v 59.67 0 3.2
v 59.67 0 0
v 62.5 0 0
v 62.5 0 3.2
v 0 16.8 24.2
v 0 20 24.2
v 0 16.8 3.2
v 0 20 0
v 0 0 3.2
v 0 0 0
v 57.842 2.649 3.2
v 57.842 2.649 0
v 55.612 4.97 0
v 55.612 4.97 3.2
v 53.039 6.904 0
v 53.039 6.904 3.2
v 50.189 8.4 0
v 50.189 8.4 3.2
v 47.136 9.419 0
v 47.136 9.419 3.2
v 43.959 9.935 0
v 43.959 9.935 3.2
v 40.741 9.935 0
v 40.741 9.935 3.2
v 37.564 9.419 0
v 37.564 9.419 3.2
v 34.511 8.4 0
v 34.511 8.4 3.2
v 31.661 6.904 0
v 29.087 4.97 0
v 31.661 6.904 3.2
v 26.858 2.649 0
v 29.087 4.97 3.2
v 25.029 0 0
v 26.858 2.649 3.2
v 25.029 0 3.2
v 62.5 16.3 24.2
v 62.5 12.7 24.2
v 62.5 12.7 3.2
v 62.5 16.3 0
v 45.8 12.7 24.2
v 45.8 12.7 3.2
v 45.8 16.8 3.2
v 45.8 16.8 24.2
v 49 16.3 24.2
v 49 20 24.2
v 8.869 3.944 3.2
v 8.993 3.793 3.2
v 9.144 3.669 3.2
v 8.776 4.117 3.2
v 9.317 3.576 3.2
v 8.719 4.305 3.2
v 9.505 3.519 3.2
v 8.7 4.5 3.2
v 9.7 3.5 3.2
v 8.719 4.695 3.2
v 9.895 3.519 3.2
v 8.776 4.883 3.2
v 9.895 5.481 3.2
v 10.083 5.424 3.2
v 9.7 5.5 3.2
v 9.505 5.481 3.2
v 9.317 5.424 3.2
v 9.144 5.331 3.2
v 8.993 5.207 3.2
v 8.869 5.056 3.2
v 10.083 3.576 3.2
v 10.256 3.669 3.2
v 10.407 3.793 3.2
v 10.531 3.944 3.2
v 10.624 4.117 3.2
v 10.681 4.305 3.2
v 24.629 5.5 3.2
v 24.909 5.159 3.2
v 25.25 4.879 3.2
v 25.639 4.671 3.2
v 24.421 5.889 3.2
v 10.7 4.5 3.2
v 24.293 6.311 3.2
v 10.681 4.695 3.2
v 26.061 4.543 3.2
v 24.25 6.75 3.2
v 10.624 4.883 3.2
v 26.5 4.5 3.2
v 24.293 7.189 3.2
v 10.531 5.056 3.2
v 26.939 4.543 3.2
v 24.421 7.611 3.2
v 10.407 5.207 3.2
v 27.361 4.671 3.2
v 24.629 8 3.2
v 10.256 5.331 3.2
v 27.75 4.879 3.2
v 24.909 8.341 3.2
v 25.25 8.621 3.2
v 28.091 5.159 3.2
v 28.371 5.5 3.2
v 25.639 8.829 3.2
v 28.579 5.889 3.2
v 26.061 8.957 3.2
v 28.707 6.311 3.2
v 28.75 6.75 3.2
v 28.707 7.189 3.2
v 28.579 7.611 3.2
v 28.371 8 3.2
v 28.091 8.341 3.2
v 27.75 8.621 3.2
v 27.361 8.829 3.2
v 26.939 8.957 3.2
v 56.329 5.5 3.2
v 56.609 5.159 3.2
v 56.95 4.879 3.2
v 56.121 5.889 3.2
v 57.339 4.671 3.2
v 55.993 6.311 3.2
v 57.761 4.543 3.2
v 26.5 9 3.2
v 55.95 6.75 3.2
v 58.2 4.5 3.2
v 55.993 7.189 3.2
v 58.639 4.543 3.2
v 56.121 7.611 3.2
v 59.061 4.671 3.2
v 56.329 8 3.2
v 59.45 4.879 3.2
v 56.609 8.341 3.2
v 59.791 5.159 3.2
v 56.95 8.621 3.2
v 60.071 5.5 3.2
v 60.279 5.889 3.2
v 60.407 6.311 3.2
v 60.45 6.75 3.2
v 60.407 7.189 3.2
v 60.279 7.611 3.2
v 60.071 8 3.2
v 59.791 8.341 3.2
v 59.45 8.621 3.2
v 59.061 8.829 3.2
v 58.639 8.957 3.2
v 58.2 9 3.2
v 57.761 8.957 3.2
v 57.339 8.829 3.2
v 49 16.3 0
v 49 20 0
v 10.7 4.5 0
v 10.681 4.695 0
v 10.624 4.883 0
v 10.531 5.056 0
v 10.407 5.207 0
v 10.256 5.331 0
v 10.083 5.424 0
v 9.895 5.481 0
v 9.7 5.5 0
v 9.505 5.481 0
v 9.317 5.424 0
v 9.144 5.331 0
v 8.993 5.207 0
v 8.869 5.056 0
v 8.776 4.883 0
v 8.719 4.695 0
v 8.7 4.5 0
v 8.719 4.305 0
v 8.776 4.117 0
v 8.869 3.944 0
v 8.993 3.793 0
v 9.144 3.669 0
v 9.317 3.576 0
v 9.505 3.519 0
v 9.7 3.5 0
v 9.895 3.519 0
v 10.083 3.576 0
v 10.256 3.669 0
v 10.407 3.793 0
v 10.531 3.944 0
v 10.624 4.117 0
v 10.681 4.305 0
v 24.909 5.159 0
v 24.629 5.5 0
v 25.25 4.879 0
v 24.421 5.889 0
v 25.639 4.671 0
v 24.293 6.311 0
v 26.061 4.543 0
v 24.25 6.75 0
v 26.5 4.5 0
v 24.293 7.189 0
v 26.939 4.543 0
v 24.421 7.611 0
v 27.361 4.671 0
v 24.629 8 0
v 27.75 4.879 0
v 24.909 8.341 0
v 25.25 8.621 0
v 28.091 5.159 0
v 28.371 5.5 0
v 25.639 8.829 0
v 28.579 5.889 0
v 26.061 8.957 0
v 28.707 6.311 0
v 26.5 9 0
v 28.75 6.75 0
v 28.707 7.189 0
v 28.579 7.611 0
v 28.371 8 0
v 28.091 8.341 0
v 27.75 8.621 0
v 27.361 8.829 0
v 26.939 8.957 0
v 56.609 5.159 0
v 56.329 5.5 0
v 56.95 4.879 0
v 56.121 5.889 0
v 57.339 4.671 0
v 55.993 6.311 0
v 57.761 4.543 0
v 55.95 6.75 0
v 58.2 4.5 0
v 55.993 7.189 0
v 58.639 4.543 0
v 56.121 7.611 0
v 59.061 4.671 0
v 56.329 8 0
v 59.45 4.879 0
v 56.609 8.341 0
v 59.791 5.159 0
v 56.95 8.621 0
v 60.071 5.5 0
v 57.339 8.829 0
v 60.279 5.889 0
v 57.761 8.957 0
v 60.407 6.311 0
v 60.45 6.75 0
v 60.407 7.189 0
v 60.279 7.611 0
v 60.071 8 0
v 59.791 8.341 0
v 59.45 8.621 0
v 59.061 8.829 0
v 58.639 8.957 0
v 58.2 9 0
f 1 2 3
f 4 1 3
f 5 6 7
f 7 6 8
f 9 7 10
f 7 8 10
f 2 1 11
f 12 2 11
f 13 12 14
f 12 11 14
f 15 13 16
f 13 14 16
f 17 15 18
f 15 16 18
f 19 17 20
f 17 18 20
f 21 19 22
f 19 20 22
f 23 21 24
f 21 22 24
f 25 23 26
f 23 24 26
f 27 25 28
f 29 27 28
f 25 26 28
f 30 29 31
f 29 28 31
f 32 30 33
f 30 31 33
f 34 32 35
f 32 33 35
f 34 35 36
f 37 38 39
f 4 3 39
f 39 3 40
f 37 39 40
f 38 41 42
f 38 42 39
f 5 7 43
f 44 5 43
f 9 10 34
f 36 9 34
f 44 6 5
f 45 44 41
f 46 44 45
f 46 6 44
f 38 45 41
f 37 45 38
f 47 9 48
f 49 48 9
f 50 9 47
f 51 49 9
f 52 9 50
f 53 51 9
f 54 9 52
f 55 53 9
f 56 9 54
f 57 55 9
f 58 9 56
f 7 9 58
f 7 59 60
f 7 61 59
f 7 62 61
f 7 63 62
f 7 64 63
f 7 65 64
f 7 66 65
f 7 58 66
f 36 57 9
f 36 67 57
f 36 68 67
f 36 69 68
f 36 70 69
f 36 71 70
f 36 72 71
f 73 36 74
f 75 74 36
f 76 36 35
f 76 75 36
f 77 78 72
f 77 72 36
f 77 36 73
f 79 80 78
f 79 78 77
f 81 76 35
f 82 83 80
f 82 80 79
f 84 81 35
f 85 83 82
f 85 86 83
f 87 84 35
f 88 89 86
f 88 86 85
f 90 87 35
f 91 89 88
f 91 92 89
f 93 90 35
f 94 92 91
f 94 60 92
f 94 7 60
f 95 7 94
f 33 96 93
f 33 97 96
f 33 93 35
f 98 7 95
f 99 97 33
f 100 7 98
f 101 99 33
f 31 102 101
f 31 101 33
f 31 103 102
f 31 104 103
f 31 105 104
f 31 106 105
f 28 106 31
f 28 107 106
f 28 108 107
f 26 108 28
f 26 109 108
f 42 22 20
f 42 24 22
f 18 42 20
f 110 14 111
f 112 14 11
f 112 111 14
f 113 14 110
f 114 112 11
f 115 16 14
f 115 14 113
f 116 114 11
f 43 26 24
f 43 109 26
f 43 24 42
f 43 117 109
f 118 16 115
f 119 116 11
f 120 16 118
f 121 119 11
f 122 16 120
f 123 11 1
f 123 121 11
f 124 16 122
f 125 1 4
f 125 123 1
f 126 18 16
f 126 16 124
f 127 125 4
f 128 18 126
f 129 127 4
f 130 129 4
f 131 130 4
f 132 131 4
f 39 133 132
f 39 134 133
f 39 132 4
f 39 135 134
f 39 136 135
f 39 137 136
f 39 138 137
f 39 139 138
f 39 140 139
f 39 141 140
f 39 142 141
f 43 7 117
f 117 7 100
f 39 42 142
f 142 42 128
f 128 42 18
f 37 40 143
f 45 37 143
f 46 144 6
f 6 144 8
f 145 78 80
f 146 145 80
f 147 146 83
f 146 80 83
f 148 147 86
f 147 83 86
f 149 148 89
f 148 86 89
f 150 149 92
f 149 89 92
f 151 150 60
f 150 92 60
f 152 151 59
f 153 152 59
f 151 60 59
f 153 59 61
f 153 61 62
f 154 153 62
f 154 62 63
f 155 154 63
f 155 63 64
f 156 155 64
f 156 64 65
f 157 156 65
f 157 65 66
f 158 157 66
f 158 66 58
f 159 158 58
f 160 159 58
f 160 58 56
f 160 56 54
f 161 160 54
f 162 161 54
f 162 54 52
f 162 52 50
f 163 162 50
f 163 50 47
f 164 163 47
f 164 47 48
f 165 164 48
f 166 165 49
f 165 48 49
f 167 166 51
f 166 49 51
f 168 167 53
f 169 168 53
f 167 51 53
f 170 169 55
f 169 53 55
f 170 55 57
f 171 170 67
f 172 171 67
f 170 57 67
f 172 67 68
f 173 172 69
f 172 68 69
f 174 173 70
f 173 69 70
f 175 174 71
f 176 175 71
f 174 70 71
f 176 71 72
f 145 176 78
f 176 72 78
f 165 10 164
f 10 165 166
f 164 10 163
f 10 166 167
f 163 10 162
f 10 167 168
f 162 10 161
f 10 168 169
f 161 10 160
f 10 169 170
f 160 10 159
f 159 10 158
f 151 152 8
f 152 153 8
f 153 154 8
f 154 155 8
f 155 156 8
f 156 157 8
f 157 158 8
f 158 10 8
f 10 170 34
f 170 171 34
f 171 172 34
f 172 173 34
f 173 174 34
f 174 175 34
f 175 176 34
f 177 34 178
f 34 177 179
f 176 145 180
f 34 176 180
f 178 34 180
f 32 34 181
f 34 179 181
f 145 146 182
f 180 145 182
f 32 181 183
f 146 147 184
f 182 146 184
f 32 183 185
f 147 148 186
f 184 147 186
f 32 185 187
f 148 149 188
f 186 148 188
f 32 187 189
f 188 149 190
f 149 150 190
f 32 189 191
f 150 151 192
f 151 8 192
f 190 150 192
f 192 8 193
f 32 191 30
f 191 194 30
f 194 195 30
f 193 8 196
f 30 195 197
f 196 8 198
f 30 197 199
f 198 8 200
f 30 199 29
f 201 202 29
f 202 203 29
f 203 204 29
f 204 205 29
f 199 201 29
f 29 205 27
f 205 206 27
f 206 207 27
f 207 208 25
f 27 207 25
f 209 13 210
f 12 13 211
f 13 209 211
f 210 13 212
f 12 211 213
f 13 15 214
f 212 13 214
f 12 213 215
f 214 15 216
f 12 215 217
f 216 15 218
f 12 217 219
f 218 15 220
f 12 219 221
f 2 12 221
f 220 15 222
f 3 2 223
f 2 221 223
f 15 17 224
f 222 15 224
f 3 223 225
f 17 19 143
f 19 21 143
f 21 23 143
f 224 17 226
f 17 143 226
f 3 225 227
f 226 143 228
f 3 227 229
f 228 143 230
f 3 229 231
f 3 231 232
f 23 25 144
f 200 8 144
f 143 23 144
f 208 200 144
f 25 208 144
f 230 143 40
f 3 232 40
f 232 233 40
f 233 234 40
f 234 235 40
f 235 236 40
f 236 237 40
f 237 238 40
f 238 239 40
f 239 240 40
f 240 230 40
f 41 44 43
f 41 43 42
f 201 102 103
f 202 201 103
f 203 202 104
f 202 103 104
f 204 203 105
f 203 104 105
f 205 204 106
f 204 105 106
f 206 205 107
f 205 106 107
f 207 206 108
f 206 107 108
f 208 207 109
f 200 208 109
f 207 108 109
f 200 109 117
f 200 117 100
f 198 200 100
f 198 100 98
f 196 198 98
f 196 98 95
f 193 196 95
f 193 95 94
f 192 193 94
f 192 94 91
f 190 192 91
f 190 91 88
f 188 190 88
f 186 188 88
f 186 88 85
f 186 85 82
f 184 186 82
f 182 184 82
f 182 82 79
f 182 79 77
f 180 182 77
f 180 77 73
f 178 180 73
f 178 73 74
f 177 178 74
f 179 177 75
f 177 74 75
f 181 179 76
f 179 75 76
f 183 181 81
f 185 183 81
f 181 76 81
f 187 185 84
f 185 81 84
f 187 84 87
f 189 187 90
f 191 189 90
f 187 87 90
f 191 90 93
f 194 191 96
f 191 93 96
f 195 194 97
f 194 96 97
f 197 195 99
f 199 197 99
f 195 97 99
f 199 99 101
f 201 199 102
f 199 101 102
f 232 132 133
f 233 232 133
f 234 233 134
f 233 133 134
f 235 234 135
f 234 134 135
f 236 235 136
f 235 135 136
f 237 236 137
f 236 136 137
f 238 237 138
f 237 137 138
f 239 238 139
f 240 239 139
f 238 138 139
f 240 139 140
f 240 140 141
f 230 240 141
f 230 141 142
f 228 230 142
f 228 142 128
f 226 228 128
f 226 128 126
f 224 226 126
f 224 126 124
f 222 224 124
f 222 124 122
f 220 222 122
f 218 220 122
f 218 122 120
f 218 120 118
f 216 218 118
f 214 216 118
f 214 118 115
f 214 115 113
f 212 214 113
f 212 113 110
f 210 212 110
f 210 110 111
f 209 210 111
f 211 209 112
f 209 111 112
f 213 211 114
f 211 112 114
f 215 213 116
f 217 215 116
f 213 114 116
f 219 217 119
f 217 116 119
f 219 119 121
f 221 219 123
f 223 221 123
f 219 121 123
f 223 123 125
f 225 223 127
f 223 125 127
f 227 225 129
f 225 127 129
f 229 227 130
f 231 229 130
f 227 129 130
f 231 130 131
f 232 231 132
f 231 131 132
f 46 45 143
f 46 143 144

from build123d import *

# Parameters (mm, degrees)
F1_DEPTH = 3.2
F2_R     = 20
F3_DEPTH = 25
F4_R     = 1
F5_DEPTH = 25
F6_R     = 2.25
F7_DEPTH = 25
F9_DEPTH = 21


with BuildPart() as f1:
    # F0 (on Top) → F1 (new body)
    with BuildSketch(Plane.XY):
        Polygon((0, 0), (62.5, 0), (62.5, 16.3), (49, 16.3), (49, 20), (0, 20), align=None)
    extrude(amount=F1_DEPTH)

    # F2 (on face) → F3 (cut)
    with BuildSketch(Plane.XY.offset(3.2)):
        with Locations((42.349905, -10)):
            Circle(F2_R)
    extrude(amount=-F3_DEPTH, mode=Mode.SUBTRACT)

    # F4 (on face) → F5 (cut)
    with BuildSketch(Plane.XY.offset(3.2)):
        with Locations((9.7, 4.5)):
            Circle(F4_R)
    extrude(amount=-F5_DEPTH, mode=Mode.SUBTRACT)

    # F6 (on face) → F7 (cut)
    with BuildSketch(Plane.XY.offset(3.2)):
        with Locations((26.5, 6.75)):
            Circle(F6_R)
        with Locations((58.2, 6.75)):
            Circle(F6_R)
    extrude(amount=-F7_DEPTH, mode=Mode.SUBTRACT)

    # F8 (on face) → F9 (join)
    with BuildSketch(Plane.XY.offset(3.2)):
        Polygon((49, 20), (0, 20), (0, 16.8), (45.8, 16.8), (45.8, 12.7), (62.5, 12.7), (62.5, 16.3), (49, 16.3), align=None)
    extrude(amount=F9_DEPTH)


solid = f1.part
